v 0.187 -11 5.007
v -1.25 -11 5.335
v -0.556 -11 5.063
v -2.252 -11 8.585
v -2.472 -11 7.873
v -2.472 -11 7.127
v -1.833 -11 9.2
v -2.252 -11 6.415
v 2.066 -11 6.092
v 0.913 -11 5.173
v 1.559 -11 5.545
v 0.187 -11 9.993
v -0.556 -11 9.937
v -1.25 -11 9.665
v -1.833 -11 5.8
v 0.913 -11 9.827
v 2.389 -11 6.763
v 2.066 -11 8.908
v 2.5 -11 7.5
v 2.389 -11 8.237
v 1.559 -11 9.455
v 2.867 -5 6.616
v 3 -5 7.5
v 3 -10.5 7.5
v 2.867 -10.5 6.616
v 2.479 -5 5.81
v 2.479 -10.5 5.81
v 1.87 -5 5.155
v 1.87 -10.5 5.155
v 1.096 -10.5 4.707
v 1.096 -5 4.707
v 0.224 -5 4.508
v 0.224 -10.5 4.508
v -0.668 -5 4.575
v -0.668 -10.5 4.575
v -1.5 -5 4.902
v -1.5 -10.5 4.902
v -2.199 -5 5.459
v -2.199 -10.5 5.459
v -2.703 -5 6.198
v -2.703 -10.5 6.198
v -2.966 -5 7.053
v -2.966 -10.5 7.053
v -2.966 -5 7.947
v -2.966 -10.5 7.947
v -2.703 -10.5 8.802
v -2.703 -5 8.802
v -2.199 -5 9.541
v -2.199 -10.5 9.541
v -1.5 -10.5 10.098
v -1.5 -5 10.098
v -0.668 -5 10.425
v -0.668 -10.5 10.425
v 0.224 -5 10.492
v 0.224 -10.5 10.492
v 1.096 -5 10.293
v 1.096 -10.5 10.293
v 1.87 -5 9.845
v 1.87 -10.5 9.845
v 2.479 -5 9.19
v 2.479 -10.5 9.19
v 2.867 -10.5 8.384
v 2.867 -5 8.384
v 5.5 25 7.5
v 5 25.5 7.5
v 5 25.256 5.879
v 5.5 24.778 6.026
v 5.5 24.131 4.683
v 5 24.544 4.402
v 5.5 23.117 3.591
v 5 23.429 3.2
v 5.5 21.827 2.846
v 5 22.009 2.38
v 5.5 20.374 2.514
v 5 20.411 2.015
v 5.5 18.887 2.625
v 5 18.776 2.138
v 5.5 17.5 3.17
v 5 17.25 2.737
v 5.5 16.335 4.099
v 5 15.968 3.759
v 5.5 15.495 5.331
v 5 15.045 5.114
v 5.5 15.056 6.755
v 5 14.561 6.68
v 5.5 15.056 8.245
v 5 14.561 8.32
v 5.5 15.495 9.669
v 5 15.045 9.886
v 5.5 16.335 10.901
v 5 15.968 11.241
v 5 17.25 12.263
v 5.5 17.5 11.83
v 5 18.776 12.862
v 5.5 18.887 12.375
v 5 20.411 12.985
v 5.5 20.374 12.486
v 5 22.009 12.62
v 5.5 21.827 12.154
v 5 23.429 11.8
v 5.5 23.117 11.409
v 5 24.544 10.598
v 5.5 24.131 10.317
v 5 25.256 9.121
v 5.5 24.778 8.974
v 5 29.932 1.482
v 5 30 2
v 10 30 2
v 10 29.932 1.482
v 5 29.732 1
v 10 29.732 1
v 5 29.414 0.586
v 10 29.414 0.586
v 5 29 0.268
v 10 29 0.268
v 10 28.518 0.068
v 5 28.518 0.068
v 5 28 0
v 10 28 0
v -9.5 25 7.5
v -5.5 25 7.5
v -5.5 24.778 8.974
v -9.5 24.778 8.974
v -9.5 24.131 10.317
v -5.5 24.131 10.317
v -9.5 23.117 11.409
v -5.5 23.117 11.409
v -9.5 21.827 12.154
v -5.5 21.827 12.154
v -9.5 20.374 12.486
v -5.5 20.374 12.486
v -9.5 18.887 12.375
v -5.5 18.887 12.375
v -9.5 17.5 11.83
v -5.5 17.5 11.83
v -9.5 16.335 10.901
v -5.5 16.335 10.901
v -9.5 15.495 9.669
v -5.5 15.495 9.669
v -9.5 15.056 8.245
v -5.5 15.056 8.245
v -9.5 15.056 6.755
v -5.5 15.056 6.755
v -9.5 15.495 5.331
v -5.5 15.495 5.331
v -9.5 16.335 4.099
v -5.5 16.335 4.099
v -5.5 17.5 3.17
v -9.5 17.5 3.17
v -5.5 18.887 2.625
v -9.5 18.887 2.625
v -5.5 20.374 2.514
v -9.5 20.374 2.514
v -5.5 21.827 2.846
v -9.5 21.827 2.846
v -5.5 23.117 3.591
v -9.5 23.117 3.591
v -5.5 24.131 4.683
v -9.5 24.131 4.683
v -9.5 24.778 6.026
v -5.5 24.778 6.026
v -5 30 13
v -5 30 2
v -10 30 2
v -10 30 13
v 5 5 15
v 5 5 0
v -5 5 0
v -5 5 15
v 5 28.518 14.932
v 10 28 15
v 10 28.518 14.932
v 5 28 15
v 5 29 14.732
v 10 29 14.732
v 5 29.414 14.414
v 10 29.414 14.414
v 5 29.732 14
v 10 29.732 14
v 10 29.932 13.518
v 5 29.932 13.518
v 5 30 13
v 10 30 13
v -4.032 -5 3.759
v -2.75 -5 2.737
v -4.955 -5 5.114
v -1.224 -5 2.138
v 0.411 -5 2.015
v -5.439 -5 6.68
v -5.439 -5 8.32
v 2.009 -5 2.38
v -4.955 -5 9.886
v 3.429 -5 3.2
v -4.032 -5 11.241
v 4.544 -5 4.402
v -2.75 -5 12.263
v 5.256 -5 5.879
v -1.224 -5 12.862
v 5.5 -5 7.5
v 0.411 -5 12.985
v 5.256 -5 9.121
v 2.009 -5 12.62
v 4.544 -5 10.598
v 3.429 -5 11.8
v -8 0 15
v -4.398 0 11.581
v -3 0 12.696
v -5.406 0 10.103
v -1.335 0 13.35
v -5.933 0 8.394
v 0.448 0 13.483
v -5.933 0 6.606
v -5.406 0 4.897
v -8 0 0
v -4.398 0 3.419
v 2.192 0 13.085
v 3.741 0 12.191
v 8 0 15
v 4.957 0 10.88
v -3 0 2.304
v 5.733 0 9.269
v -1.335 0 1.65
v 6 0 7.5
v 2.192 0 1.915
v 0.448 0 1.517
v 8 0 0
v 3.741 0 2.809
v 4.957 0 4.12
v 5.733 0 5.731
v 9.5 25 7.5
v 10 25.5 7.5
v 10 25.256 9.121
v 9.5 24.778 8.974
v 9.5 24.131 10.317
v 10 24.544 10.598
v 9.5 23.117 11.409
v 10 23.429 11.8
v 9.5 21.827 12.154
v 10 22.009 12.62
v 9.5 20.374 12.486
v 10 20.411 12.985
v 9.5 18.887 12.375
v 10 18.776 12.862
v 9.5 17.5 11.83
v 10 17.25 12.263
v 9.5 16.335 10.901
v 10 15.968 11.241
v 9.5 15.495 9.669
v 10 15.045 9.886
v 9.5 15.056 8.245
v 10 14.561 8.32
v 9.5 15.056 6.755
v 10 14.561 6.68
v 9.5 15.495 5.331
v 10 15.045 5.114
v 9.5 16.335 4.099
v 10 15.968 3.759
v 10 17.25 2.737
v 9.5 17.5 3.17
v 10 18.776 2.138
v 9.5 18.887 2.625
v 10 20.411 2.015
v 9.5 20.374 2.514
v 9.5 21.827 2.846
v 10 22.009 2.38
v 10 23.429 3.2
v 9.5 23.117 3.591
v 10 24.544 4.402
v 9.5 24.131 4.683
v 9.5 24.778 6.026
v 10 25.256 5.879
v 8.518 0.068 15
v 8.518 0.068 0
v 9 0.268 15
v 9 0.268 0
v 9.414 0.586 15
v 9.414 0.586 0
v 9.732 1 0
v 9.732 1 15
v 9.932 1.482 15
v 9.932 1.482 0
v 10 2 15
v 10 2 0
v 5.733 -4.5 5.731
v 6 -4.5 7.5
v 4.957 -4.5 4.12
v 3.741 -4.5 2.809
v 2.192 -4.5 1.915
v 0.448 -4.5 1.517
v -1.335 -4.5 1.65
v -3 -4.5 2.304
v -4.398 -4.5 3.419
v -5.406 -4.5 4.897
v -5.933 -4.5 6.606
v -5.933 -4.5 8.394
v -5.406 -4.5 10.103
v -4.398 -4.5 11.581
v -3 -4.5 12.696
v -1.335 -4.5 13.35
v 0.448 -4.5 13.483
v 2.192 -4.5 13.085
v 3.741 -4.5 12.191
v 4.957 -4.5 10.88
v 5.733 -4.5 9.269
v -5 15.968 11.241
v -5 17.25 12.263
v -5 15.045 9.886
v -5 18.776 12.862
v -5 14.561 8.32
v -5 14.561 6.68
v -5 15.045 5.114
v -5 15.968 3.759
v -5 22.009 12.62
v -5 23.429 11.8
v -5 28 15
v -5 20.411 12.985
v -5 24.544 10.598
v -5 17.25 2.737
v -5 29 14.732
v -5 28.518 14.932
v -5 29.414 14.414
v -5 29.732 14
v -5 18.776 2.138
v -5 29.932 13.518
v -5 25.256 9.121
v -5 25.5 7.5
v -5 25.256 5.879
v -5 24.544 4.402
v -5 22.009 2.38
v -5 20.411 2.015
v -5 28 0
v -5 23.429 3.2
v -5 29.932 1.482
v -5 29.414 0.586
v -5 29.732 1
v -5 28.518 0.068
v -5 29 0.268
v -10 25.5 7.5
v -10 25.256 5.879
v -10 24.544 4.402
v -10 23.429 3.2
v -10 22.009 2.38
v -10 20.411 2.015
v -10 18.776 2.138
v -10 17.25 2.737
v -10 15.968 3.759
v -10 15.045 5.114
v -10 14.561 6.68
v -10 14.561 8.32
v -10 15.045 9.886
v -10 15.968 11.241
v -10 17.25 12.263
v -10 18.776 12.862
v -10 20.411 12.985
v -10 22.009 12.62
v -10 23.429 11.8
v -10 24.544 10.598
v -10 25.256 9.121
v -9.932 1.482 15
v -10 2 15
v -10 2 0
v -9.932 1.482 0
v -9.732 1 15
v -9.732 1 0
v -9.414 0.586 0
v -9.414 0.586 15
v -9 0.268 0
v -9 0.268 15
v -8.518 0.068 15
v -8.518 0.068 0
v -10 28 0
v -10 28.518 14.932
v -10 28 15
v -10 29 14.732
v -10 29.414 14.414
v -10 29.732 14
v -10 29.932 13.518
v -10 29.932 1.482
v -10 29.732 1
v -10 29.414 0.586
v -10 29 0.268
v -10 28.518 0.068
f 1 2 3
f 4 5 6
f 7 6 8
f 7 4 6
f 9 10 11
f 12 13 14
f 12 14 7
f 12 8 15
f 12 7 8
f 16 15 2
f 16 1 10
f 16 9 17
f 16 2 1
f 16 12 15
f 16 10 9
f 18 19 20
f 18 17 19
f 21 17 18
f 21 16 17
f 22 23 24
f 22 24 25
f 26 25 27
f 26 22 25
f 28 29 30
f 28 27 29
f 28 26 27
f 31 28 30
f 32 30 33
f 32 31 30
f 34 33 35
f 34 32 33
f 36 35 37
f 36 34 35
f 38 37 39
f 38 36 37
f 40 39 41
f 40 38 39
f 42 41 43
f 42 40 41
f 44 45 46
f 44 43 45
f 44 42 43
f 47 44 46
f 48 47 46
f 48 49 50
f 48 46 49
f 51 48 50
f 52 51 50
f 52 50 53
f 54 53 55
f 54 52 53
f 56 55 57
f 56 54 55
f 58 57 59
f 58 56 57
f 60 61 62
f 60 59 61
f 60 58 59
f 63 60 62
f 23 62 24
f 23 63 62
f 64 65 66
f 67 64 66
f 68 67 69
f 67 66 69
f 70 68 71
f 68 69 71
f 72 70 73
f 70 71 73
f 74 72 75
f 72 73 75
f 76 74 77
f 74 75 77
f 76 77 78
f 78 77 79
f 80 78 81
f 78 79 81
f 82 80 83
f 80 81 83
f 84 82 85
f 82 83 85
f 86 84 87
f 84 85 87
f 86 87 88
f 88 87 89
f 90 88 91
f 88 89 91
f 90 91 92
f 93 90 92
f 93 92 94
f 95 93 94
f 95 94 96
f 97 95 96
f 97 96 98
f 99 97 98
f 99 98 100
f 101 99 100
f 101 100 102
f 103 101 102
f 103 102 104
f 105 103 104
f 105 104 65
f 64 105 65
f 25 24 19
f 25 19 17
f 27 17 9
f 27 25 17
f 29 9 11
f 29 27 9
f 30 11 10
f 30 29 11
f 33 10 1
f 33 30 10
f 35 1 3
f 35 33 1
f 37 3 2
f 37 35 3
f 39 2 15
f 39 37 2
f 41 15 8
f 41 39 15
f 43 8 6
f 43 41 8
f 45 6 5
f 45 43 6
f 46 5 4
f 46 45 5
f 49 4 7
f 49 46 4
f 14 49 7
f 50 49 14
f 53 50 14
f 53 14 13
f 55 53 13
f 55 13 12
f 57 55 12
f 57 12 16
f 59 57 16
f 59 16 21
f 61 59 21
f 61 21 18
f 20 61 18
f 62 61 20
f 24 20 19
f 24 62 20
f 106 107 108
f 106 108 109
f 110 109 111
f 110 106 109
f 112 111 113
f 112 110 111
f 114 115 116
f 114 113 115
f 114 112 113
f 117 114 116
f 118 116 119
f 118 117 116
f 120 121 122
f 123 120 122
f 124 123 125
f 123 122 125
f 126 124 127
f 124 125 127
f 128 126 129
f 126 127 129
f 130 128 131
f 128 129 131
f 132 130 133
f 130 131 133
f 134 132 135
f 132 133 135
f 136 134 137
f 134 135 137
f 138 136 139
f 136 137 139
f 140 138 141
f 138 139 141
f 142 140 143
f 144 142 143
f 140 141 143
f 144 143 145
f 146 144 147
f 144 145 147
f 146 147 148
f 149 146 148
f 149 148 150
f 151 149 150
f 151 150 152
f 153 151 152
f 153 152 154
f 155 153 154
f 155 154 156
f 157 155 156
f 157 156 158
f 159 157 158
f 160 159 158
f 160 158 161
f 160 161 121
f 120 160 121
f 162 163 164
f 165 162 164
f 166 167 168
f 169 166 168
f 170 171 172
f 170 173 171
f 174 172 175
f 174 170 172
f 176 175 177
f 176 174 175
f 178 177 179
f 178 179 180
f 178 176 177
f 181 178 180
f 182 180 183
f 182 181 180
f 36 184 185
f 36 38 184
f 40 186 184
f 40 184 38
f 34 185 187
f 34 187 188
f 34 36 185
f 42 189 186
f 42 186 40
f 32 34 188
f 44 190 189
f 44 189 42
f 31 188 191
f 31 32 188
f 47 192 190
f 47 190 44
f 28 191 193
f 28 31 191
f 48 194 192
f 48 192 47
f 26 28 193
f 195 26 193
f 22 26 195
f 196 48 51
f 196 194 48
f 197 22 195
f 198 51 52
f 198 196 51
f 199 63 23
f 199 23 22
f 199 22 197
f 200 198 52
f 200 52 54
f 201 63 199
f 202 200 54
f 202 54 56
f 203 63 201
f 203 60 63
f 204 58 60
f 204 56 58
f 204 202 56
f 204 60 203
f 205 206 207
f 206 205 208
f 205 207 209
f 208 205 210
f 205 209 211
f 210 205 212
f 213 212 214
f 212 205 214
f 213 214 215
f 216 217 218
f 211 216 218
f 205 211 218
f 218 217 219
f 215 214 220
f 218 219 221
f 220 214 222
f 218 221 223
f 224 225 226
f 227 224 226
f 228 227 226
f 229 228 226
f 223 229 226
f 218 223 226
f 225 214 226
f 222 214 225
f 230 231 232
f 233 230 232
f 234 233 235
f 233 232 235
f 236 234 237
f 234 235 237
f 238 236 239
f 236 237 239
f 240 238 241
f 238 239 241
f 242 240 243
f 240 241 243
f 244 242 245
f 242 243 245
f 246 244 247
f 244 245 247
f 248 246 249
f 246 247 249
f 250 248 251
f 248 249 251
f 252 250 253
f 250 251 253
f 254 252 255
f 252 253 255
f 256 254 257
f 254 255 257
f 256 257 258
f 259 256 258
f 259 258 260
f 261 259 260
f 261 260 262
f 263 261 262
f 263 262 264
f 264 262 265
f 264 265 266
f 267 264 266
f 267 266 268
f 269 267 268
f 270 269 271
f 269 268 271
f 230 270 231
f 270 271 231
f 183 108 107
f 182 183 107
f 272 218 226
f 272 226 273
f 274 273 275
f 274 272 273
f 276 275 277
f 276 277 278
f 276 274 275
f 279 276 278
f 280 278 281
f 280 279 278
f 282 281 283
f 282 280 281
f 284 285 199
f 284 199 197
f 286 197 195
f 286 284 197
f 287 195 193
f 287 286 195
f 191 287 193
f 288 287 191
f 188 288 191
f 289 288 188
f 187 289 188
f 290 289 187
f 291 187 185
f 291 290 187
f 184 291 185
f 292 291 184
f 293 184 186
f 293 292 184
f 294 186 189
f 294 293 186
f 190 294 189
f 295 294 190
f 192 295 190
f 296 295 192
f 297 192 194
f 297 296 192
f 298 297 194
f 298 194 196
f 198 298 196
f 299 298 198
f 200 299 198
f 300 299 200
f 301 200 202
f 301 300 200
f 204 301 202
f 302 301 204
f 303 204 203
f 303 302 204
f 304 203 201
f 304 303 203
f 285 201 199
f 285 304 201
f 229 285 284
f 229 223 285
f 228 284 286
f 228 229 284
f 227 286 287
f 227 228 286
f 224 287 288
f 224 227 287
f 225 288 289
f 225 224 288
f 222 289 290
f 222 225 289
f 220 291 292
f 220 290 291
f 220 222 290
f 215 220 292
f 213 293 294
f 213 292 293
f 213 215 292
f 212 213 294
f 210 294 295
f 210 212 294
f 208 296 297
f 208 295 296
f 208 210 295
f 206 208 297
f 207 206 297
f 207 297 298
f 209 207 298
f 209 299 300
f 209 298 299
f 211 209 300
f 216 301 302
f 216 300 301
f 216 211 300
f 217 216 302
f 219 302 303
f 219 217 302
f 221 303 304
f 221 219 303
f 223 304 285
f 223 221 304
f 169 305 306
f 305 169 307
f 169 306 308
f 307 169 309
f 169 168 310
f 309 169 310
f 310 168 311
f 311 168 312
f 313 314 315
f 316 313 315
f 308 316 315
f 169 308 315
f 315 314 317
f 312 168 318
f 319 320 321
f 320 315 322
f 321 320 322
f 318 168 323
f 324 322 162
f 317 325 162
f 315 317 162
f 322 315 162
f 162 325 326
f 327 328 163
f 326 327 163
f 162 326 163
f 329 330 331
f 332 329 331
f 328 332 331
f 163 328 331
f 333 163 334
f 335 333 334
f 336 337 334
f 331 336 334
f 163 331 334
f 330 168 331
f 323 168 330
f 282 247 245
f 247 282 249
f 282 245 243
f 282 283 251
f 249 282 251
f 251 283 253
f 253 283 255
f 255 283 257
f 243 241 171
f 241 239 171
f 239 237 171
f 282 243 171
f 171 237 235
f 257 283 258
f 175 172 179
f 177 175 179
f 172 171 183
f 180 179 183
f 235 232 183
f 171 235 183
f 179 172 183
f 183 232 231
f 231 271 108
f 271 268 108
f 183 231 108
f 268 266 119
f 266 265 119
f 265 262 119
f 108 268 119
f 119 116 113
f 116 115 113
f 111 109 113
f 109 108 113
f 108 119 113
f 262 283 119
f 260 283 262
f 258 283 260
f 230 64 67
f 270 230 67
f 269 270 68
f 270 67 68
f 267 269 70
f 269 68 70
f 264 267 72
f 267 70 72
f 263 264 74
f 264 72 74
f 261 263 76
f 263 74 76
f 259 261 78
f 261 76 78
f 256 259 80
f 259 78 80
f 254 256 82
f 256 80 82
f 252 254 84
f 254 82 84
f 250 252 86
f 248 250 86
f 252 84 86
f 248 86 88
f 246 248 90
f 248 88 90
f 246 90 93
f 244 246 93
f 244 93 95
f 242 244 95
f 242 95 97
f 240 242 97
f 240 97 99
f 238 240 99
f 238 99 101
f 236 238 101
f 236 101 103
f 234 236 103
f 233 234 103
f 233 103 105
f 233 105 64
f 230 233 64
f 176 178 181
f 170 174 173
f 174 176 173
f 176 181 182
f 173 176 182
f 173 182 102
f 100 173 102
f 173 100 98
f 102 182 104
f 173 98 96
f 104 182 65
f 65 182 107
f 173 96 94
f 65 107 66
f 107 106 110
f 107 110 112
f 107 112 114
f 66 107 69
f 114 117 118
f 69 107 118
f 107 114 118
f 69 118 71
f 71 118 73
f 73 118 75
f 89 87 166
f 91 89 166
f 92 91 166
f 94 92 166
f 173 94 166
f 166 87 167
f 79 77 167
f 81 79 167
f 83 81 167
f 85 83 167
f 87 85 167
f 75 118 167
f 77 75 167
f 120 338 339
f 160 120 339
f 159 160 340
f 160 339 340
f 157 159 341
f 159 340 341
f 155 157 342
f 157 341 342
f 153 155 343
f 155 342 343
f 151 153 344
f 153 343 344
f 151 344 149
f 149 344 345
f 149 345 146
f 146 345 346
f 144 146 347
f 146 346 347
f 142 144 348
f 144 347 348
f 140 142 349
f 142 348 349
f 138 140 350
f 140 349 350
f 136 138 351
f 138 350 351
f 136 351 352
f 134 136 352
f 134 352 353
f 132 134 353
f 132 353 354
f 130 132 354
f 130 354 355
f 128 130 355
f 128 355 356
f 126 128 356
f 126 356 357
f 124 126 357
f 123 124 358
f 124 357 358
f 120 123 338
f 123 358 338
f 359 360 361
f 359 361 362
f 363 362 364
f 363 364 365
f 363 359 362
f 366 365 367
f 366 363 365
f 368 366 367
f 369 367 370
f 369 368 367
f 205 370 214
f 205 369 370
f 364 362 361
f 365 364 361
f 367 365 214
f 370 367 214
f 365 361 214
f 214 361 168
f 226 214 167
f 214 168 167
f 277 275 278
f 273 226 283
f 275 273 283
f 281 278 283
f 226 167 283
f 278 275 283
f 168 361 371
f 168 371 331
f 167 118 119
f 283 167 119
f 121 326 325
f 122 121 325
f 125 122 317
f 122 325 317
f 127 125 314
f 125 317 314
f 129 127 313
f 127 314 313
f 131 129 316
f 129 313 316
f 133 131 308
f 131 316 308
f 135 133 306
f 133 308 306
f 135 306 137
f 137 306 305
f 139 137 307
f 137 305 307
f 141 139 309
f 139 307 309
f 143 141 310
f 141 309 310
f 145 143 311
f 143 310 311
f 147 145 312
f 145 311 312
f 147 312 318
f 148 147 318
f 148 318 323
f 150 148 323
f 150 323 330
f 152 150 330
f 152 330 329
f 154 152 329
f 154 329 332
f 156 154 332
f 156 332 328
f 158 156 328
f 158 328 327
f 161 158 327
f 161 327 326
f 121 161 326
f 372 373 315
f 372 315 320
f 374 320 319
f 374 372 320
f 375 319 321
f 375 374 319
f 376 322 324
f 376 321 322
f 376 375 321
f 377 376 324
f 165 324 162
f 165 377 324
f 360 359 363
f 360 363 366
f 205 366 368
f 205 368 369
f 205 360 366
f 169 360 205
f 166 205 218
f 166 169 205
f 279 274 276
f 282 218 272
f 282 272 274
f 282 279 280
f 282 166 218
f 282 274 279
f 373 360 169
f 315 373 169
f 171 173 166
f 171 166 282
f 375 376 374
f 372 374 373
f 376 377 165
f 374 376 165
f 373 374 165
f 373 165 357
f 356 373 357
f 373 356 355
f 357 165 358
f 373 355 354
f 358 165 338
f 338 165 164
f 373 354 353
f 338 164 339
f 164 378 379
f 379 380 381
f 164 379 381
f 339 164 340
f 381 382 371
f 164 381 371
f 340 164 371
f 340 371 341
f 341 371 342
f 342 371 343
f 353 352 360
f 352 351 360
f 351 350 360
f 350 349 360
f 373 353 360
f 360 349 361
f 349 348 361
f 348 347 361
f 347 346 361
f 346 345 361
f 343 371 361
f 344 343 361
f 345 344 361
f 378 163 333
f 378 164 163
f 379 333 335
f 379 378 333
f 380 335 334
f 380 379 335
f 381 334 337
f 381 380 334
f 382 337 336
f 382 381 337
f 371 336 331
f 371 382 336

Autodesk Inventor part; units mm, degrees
ref_plane "YZ Plane" through (0, 0, 0) normal (1, 0, 0) x (0, 1, 0)
ref_plane "XZ Plane" through (0, 0, 0) normal (0, 1, 0) x (-1, 0, 0)
ref_plane "XY Plane" through (0, 0, 0) normal (0, 0, 1) x (1, 0, 0)
sketch "Schizzo1" plane through (0, 0, 0) normal (0, 0, 1) x (1, 0, 0)
  line L0 (-10, 30) -> (-10, 0)
  line L1 (-10, 0) -> (10, 0)
  line L2 (10, 0) -> (10, 30)
  line L3 (10, 30) -> (5, 30)
  line L4 (5, 30) -> (5, 5)
  line L5 (5, 5) -> (-5, 5)
  line L6 (-5, 5) -> (-5, 30)
  line L7 (-5, 30) -> (-10, 30)
  point P0 (0, 0)
  point P1 (0, 5)
  point P2 (0, 0)
  dimension "d0" = 20
  dimension "d1" = 10
  dimension "d2" = 5
  dimension "d3" = 30
extrude "Estrusione1" add sketch "Schizzo1" along normal blind 15
sketch "Schizzo2" plane through (0, 0, 0) normal (1, 0, 0) x (0, 1, 0)
  line L0 (5, 0) -> (30, 0) projected
  line L1 (30, 0) -> (30, 15) projected
  line L2 (5, 15) -> (30, 15) projected
  line L3 (5, 0) -> (5, 15) projected
  circle A0 centre (20, 7.5) radius 5
  point P0 (0, 0)
  point P1 (30, 7.5)
  point P2 (17.5, 0)
  dimension "d6" = 10
  dimension "d23" = 10
extrude "Estrusione2" cut sketch "Schizzo2" along normal through all both and the other way through all contours A0
fillet "Raccordo1" radius 2 6 edges at (-7.5, 30, 15) (-7.5, 30, 0) (7.5, 30, 15) (7.5, 30, 0) (10, 0, 7.5) (-10, 0, 7.5)
sketch "Schizzo3" plane through (-8, 0, 0) normal (0, -1, 0) x (1, 0, 0)
  line L0 (0, 0) -> (0, 15) projected
  line L1 (0, 0) -> (16, 0) projected
  line L2 (16, 15) -> (16, 0) projected
  line L3 (0, 15) -> (16, 15) projected
  circle A0 centre (8, 7.5) radius 6
  point P0 (8, 0)
  point P1 (16, 7.5)
  point P2 (8, 0)
  dimension "d13" = 12
extrude "Estrusione3" add sketch "Schizzo3" along normal blind 5 contours A0
sketch "Schizzo4" plane through (0, -5, 7.5) normal (0, -1, 0) x (1, 0, 0)
  circle A0 centre (0, 0) radius 3
  point P0 (0, -7.5)
  dimension "d16" = 6
extrude "Estrusione4" add sketch "Schizzo4" along normal blind 6
chamfer "Smusso1" distance 0.5 angle 45 6 edges at (-5, 15, 7.5) (5, 15, 7.5) (-10, 15, 7.5) (10, 15, 7.5) (-3, -11, 7.5) (-6, -5, 7.5)
thread "Filettatura2" size "M6x1" class "6g" standard "ANSI Metric M Profile" length 10
properties part number "Forcella movimento lama" material "Acciaio inossidabile"
